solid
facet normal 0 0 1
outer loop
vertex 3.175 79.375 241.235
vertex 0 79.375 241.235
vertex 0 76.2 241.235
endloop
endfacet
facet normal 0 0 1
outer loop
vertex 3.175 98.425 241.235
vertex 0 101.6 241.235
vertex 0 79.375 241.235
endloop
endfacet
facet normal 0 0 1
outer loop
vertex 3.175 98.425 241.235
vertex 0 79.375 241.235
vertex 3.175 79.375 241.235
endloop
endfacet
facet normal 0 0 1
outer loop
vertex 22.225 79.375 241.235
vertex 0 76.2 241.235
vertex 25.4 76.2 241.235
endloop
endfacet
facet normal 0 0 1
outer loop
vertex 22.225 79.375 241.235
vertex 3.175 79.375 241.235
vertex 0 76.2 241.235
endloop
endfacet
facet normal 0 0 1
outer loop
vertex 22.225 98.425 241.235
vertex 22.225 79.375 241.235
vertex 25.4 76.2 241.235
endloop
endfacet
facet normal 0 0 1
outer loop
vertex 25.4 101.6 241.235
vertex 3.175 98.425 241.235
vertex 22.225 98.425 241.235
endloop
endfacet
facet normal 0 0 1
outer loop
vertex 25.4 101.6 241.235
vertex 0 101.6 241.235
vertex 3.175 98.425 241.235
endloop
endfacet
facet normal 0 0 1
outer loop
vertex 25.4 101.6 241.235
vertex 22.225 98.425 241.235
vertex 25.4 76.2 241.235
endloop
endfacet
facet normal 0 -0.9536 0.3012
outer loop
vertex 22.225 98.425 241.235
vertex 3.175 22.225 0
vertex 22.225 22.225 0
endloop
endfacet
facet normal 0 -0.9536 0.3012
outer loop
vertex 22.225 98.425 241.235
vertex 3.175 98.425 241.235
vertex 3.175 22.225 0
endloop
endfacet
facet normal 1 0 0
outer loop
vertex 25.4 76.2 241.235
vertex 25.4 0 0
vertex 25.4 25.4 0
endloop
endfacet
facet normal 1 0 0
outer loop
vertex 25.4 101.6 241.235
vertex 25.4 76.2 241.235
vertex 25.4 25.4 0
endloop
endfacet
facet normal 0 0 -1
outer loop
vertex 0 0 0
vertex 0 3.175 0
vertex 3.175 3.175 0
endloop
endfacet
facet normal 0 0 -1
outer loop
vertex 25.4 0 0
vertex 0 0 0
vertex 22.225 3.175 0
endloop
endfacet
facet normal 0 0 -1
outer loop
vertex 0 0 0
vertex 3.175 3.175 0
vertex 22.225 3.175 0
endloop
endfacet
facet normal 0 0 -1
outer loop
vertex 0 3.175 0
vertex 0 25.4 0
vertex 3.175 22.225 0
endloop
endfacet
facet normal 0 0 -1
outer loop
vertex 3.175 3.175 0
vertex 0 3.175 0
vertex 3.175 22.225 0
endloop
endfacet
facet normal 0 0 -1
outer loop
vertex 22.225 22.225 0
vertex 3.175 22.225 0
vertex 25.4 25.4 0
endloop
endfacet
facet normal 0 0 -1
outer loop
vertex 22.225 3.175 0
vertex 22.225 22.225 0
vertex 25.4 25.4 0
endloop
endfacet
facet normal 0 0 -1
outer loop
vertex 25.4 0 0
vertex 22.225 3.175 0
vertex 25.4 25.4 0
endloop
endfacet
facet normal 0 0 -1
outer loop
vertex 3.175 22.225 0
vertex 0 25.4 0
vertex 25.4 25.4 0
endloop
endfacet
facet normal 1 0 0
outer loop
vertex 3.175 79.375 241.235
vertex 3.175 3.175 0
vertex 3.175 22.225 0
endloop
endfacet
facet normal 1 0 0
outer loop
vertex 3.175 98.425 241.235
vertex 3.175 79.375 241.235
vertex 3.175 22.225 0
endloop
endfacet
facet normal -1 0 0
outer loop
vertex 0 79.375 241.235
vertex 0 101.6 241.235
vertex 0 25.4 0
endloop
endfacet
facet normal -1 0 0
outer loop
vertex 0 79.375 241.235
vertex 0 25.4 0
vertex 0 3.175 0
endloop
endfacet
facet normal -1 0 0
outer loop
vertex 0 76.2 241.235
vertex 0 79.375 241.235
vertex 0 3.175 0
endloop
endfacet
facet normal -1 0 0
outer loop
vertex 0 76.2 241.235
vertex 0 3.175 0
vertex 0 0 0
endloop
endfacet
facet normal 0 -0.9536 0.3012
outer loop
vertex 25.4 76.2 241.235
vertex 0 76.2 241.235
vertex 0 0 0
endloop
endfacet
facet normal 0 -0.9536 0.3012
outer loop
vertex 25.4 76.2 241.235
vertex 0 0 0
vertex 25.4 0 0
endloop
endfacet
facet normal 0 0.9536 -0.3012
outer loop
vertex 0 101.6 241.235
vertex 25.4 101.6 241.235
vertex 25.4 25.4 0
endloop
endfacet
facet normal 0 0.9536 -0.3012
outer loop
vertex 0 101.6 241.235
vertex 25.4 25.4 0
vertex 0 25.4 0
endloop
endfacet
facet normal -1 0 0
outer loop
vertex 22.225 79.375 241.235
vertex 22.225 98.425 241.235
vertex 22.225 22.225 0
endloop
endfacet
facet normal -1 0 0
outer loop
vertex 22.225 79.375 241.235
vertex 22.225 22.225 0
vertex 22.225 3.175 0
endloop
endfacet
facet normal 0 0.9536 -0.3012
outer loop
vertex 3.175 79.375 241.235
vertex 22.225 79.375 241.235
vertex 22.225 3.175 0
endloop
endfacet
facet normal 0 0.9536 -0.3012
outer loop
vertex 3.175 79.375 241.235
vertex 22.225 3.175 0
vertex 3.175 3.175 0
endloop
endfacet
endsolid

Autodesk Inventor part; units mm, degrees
ref_plane "XZ Plane" through (0, 0, 0) normal (0, 1, 0) x (-1, 0, 0)
sketch "Sketch1" plane through (0, 0, 0) normal (0, 0, 1) x (1, 0, 0)
  line L0 (0, 0) -> (25.4, 0)
  line L1 (25.4, 0) -> (25.4, 25.4)
  line L2 (25.4, 25.4) -> (0, 25.4)
  line L3 (0, 25.4) -> (0, 0)
  line L4 (0, 0) -> (0, 3.175)
  line L5 (0, 3.175) -> (3.175, 3.175)
  line L6 (3.175, 3.175) -> (22.225, 3.175)
  line L7 (22.225, 3.175) -> (22.225, 22.225)
  line L8 (22.225, 22.225) -> (3.175, 22.225)
  line L9 (3.175, 22.225) -> (3.175, 3.175)
  dimension "d0" = 25.4
  dimension "d1" = 25.4
  dimension "d2" = 3.175
  dimension "d3" = 3.175
  dimension "d4" = 19.05
  dimension "d5" = 19.05
ref_plane "Work Plane1" through (0, 0, 0) normal (0, 0, 1) x (1, 0, 0)
ref_plane "Work Plane2" through (12.7, 0, 0) normal (1, 0, 0) x (0, 1, 0)
sketch "Sketch2" plane through (12.7, 0, 0) normal (1, 0, 0) x (0, 1, 0)
  line L0 (12.7, 0) -> (88.9001, 241.2353)
  line L1 (12.7, 0) -> (265.684, 0) construction
  line L2 (0, 0) -> (25.4, 0) projected
  dimension "d9" = 252.984
  dimension "d10" = 72.47
  dimension "d12" = 12.7
  dimension "d13" = 0
sweep "Sweep1" add profiles "Sketch1" path "Sketch2" path curves L0
properties part number "Wonkey"
